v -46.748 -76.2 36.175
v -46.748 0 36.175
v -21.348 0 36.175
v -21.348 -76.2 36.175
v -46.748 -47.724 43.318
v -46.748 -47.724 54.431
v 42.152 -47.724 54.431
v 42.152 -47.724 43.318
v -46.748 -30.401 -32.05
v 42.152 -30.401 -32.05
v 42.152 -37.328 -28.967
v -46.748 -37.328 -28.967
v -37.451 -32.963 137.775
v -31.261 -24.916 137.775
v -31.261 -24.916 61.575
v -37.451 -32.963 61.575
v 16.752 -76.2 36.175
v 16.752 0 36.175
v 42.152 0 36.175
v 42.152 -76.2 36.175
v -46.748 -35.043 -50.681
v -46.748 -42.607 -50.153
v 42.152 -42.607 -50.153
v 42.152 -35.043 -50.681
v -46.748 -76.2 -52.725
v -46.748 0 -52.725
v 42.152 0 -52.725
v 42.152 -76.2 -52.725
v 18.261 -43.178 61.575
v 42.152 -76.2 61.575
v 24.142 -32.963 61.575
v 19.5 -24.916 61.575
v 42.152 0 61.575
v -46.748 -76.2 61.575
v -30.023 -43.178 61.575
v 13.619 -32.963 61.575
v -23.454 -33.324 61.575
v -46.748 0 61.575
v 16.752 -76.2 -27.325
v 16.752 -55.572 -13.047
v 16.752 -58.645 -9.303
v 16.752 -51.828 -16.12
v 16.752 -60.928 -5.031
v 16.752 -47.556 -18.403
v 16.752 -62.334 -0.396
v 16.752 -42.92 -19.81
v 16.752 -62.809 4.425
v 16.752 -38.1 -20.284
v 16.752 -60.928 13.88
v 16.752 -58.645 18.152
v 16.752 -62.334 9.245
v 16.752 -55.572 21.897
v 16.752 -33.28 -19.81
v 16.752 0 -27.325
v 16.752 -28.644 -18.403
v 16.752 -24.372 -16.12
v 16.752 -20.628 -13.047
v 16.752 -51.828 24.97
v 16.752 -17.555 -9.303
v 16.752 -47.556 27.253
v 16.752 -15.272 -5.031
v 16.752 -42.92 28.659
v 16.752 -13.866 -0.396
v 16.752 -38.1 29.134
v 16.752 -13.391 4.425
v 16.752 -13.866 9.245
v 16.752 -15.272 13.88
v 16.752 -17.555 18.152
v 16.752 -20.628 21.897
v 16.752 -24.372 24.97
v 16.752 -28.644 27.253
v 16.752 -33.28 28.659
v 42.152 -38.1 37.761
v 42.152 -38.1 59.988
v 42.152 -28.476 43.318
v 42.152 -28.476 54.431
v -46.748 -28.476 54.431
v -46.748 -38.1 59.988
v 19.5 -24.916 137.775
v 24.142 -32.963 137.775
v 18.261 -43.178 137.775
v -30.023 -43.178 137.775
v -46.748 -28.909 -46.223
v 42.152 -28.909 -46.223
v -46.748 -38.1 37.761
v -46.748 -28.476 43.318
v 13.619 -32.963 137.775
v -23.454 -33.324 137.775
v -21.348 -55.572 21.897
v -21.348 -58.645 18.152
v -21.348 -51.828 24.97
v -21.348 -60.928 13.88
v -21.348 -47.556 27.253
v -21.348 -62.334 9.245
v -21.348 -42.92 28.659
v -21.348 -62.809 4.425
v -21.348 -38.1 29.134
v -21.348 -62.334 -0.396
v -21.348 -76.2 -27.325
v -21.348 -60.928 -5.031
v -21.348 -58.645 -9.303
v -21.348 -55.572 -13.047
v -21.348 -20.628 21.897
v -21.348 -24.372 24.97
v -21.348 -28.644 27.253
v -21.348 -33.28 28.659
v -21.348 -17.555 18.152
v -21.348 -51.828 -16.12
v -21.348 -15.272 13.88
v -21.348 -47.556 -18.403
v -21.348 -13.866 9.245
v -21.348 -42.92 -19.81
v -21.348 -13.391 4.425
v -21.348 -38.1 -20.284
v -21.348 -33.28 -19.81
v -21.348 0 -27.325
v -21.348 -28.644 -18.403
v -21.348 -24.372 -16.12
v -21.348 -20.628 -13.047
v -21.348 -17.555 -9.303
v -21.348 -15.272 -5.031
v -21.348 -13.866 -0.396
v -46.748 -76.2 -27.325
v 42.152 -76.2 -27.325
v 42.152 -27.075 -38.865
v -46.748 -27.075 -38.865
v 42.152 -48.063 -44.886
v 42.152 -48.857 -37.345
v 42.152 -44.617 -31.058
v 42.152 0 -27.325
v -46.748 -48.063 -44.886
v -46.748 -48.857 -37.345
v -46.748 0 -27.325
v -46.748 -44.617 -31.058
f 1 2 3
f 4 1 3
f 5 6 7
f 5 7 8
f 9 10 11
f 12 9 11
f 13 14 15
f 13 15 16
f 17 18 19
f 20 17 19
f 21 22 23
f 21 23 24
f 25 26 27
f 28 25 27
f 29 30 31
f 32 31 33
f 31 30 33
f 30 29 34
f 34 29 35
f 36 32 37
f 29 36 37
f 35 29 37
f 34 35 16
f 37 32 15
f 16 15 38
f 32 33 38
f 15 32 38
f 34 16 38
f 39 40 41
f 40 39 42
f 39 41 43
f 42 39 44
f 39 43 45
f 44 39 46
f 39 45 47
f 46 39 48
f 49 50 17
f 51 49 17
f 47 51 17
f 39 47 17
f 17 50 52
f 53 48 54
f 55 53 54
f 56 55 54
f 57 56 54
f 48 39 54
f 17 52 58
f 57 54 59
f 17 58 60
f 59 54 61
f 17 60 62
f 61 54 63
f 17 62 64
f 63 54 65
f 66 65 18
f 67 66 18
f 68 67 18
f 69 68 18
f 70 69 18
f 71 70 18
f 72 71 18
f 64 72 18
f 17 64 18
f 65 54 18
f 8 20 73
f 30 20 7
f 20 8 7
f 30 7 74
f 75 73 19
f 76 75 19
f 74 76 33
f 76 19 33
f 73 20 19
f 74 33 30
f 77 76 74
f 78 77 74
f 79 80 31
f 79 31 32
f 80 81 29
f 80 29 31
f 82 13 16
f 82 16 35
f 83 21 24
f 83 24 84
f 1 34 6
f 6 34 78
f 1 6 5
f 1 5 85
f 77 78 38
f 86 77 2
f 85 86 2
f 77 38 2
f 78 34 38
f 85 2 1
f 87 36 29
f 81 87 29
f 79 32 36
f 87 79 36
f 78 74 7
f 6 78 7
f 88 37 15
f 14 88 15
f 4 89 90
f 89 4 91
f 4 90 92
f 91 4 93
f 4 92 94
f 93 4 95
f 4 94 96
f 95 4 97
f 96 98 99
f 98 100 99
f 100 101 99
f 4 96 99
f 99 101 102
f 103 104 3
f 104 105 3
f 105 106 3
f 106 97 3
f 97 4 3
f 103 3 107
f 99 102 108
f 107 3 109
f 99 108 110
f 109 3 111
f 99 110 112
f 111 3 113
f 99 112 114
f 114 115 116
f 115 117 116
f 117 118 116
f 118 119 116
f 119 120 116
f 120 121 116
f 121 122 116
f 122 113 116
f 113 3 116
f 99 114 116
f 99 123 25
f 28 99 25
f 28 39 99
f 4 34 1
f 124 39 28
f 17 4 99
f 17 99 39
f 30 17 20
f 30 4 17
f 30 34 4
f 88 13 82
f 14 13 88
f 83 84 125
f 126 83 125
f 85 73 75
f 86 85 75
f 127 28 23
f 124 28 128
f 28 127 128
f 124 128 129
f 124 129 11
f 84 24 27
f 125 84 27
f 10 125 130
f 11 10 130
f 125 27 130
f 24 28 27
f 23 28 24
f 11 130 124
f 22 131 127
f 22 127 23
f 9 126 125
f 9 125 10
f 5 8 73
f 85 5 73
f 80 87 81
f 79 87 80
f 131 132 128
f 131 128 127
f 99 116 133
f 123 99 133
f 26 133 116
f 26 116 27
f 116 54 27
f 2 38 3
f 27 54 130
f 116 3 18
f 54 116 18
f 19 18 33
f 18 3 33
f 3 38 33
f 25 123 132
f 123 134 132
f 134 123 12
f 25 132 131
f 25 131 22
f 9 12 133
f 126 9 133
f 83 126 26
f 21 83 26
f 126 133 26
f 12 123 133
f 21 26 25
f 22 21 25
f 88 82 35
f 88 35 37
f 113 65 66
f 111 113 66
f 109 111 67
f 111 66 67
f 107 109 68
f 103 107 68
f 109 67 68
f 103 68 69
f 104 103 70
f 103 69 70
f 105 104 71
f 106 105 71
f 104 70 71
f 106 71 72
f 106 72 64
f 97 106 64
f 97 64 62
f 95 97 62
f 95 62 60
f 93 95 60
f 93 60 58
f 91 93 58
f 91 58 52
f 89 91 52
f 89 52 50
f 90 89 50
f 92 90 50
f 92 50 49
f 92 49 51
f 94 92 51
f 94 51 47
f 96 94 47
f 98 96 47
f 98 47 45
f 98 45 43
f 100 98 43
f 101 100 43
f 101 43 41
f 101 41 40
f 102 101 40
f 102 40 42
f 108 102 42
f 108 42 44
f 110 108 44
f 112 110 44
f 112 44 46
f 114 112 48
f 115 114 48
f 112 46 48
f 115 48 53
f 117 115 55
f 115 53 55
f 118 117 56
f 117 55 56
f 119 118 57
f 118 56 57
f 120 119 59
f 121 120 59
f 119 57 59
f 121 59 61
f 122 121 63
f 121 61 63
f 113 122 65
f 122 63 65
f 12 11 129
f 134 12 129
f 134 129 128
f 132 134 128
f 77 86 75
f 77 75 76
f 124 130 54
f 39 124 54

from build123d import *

# Parameters (mm, degrees)
F1_DEPTH  = 76.2
F2_R      = 24.709067
F3_DEPTH  = 63.501
F5_DEPTH  = 88.901
F7_DEPTH  = 88.901
F10_DEPTH = 76.2


with BuildPart() as f1:
    # F0 (on Front) → F1 (new body)
    with BuildSketch(Plane.XZ):
        Polygon((-46.748187, -27.325264), (-46.748187, -52.725264), (42.151813, -52.725264), (42.151813, -27.325264), (16.751813, -27.325264), (16.751813, 36.174736), (42.151813, 36.174736), (42.151813, 61.574736), (-46.748187, 61.574736), (-46.748187, 36.174736), (-21.348187, 36.174736), (-21.348187, -27.325264), align=None)
    extrude(amount=F1_DEPTH)

    # F2 (on face) → F3 (cut, through all)
    with BuildSketch(Plane.YZ.offset(16.751813)):
        with Locations((-38.1, 4.424736)):
            Circle(F2_R)
    extrude(amount=-F3_DEPTH, mode=Mode.SUBTRACT)

    # F4 (on face) → F5 (cut, through all)
    with BuildSketch(Plane.YZ.offset(42.151813)):
        Polygon((-28.475514, 43.318036), (-28.475514, 54.431435), (-38.1, 59.988135), (-47.724486, 54.431435), (-47.724486, 43.318036), (-38.1, 37.761336), align=None)
    extrude(amount=-F5_DEPTH, mode=Mode.SUBTRACT)

    # F6 (on face) → F7 (cut, through all)
    with BuildSketch(Plane.YZ.offset(42.151813)):
        Polygon((-44.617329, -31.057962), (-48.856635, -37.34517), (-48.062791, -44.886425), (-42.607247, -50.153088), (-35.042712, -50.68083), (-28.908716, -46.222715), (-27.075424, -38.864743), (-30.400653, -32.049793), (-37.328493, -28.966654), align=None)
    extrude(amount=-F7_DEPTH, mode=Mode.SUBTRACT)

    # F9 (on face) → F10 (join)
    with BuildSketch(Plane.XY.offset(61.574736)):
        Polygon((-23.453956, -33.323833), (-31.261161, -24.916075), (-37.451491, -32.963499), (-30.023094, -43.177541), align=None)
        Polygon((24.142282, -32.963499), (19.499537, -24.916075), (13.618723, -32.963499), (18.261472, -43.177541), align=None)
    extrude(amount=F10_DEPTH)


solid = f1.part
